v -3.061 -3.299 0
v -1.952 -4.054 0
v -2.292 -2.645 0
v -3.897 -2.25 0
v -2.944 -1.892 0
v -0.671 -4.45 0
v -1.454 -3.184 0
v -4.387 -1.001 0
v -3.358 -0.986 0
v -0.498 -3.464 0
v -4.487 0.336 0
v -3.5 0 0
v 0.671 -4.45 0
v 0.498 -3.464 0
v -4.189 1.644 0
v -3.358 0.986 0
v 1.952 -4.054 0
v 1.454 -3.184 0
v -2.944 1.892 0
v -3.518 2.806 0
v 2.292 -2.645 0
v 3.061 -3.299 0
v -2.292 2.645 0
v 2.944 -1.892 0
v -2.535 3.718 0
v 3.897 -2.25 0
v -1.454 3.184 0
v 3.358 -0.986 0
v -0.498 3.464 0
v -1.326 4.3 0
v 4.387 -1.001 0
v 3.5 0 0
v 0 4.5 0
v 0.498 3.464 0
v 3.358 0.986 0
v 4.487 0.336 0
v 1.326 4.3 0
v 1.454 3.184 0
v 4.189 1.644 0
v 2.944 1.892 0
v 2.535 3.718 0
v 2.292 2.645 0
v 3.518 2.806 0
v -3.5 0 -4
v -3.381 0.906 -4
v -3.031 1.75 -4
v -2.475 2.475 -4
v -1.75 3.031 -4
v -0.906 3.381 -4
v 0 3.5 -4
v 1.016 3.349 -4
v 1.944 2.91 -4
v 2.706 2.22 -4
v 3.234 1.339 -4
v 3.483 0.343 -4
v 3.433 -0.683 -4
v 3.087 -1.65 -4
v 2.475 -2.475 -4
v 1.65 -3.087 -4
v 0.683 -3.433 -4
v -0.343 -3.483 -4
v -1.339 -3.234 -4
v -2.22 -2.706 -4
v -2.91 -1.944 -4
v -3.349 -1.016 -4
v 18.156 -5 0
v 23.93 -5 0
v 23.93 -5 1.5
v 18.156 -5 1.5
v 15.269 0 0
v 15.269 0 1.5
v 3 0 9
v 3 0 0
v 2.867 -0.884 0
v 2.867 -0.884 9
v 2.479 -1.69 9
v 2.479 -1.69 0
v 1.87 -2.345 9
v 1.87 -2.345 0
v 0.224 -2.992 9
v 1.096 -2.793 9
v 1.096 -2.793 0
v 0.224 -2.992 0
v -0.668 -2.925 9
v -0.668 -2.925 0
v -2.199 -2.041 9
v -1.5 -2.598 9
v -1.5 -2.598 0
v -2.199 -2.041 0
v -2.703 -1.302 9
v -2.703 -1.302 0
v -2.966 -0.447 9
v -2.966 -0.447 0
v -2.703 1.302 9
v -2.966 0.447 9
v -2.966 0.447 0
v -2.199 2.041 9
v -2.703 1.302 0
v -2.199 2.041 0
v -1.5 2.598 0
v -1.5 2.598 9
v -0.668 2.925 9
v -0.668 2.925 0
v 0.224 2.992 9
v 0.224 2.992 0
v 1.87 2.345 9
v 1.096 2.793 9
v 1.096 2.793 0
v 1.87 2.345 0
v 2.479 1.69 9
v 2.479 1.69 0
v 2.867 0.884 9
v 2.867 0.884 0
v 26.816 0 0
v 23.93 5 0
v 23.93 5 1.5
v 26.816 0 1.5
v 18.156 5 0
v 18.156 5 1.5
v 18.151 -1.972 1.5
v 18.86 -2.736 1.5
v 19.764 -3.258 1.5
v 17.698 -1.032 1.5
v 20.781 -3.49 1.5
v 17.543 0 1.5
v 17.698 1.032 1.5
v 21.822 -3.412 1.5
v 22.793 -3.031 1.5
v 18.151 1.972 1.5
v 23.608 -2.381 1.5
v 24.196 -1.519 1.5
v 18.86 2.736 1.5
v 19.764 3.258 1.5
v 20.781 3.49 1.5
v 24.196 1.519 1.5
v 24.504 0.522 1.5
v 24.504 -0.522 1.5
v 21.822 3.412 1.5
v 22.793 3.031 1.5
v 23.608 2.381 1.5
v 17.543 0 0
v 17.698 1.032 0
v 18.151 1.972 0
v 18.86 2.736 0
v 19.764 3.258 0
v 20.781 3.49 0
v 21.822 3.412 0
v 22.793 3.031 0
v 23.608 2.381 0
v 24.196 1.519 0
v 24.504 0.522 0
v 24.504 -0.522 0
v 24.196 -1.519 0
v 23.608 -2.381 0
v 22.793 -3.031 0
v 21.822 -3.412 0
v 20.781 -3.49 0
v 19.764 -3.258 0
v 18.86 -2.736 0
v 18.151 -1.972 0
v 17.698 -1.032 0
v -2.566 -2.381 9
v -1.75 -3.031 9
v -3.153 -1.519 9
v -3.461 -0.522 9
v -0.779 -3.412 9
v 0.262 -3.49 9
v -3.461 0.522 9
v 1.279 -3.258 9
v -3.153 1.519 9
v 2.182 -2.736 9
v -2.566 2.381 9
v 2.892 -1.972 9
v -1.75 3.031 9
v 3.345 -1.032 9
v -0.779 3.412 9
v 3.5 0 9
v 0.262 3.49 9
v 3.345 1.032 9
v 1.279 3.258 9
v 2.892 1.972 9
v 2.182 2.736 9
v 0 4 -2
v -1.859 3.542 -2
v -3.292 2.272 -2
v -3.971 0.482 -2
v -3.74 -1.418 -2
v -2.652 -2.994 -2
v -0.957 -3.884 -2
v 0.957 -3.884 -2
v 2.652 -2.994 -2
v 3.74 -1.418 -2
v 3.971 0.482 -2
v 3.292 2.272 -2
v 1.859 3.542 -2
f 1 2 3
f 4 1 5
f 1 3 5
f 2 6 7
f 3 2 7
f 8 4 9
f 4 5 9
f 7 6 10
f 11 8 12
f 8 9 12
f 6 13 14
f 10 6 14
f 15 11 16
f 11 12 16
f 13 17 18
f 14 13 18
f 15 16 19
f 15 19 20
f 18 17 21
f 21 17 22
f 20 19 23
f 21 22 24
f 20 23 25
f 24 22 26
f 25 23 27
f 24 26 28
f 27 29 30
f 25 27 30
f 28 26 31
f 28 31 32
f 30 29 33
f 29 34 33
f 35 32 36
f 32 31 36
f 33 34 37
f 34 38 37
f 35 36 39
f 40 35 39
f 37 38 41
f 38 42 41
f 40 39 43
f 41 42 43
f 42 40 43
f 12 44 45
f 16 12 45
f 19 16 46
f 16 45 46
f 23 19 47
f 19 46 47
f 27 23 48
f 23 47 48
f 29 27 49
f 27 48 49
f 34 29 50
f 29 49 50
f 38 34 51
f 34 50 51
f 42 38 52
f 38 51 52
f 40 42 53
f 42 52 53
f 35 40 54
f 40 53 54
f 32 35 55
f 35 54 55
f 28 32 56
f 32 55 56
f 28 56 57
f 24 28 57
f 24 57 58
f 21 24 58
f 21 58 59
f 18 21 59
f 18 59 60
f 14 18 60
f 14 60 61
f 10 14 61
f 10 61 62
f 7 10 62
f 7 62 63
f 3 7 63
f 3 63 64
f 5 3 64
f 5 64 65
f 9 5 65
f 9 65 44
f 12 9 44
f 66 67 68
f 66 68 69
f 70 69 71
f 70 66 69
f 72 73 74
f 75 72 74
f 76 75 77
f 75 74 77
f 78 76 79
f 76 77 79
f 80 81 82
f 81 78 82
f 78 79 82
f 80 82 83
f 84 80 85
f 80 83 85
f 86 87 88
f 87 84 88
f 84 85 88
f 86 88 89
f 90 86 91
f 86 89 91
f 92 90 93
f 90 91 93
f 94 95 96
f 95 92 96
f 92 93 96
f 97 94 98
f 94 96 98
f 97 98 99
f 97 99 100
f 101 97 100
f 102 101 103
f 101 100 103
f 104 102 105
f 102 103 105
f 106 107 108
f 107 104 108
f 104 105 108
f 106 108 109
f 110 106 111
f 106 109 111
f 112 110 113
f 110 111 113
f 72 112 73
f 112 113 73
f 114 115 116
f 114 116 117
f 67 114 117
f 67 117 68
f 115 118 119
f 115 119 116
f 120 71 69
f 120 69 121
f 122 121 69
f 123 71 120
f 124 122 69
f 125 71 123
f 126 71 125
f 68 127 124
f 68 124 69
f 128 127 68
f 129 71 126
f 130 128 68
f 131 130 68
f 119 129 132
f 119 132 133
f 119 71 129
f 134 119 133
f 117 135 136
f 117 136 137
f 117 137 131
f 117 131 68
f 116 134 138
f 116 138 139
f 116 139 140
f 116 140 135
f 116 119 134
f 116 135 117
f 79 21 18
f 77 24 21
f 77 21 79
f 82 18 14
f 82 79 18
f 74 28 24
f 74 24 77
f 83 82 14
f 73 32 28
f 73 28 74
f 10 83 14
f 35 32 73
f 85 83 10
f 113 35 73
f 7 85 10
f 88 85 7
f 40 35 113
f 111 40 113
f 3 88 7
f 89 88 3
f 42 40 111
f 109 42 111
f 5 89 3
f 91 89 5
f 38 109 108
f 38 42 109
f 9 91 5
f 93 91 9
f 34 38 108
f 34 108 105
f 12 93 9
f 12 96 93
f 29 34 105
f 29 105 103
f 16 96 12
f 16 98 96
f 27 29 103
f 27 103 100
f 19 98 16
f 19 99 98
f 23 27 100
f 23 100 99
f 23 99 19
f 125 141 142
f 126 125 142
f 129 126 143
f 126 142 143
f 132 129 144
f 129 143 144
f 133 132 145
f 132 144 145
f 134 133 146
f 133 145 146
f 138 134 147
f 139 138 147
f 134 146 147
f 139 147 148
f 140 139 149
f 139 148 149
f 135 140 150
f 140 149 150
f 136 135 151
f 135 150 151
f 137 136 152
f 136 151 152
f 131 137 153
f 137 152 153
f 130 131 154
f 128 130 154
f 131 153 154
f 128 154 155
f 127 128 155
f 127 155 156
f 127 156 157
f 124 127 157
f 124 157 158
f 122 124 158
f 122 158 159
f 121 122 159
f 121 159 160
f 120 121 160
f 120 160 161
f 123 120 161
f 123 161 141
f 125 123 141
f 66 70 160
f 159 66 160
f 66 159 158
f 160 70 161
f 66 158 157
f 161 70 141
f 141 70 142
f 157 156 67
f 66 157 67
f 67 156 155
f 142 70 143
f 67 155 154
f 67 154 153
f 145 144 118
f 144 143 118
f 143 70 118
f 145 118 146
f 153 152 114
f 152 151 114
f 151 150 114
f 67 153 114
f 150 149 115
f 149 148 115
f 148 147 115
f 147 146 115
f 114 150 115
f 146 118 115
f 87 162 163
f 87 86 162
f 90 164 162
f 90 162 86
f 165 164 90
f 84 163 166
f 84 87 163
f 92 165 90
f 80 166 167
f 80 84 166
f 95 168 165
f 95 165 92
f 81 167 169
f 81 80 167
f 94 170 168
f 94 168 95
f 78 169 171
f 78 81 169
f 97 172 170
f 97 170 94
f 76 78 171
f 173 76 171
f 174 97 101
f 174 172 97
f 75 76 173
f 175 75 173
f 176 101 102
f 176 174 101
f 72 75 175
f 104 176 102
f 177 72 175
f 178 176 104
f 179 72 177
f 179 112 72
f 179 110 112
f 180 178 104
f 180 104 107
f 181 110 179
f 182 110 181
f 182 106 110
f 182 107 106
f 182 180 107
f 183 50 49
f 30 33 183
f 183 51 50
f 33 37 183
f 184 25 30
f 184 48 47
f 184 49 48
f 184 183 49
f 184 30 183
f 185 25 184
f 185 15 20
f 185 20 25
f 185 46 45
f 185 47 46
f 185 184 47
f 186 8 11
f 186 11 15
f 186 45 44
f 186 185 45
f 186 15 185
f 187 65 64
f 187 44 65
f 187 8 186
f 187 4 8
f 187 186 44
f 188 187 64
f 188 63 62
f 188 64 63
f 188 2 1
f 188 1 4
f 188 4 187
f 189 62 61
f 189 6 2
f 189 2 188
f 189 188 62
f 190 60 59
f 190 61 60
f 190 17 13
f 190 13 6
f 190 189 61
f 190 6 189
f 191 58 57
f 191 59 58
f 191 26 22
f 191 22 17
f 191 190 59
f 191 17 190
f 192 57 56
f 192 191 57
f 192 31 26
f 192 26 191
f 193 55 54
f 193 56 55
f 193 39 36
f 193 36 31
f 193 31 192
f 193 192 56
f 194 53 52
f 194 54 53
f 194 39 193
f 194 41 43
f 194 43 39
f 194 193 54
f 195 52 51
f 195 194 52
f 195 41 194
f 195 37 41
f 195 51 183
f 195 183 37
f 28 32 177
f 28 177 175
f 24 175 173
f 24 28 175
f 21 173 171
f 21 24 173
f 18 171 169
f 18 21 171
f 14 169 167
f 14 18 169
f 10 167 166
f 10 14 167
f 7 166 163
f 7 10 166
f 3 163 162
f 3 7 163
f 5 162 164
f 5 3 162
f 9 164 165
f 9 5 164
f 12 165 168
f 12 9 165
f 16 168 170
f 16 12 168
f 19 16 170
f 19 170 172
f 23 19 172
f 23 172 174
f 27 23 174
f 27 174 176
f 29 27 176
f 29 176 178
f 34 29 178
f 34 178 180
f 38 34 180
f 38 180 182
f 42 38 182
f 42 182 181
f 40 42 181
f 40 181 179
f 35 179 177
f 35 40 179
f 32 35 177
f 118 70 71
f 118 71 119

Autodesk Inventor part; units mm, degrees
ref_plane "YZ Plane" through (0, 0, 0) normal (1, 0, 0) x (0, 1, 0)
ref_plane "XZ Plane" through (0, 0, 0) normal (0, 1, 0) x (-1, 0, 0)
ref_plane "XY Plane" through (0, 0, 0) normal (0, 0, 1) x (1, 0, 0)
sketch "Эскиз1" plane through (0, 0, 0) normal (0, 0, 1) x (1, 0, 0)
  circle A0 centre (0, 0) radius 3
  circle A1 centre (0, 0) radius 3.5
  dimension "d0" = 6
  dimension "d1" = 7
extrude "Выдавливание1" add sketch "Эскиз1" along normal blind 9
sketch "Эскиз2" plane through (0, 0, 0) normal (0, 0, -1) x (-1, 0, 0)
  circle A0 centre (0, 0) radius 4.5
  dimension "d4" = 9
sketch "Эскиз3" plane through (0, 0, 0) normal (1, 0, 0) x (0, 1, 0)
  line L0 (0, 0) -> (0, -4)
  line L1 (0, -4) -> (3.5, -4)
  line L2 (0, 0) -> (4.5, 0)
  line L3 (3.5, 0) -> (-3.5, 0) projected
  line L4 (4.5, 0) -> (3.5, -4)
  dimension "d5" = 4
  dimension "d6" = 3.5
  dimension "d7" = 4.5
revolve "Вращение1" add sketch "Эскиз3" angle 360 about axis through (0, 0, 0) along (0, 0, -1)
sketch "Эскиз4" plane through (0, 0, -4) normal (0, 0, -1) x (-1, 0, 0)
  circle A0 centre (0, 0) radius 3.5
extrude "Выдавливание2" cut sketch "Эскиз4" against normal up to surface (4 mm away)
thread "Резьба1" size "M7x1" class "6g" standard "ANSI Metric M Profile" length 7 offset 2
sketch "Эскиз5" plane through (0, 0, 0) normal (0, 0, 1) x (1, 0, 0)
  line L0 (23.9295, 5) -> (26.8162, 0)
  line L1 (26.8162, 0) -> (23.9295, -5)
  line L2 (23.9295, -5) -> (18.1559, -5)
  line L3 (18.1559, -5) -> (15.2692, 0)
  line L4 (15.2692, 0) -> (18.1559, 5)
  line L5 (18.1559, 5) -> (23.9295, 5)
  point P0 (0, 0)
  point P1 (21.0427, 0)
  dimension "d13" = 10
extrude "Выдавливание3" add sketch "Эскиз5" along normal blind 1.5
sketch "Эскиз6" plane through (0, 0, 0) normal (0, 0, -1) x (-1, 0, 0)
  line L0 (-26.8162, 0) -> (-23.9295, 5) projected
  line L1 (-18.1559, 5) -> (-15.2692, 0) projected
  line L2 (-26.8162, 0) -> (-15.2692, 0)
  circle A0 centre (-21.0427, 0) radius 3.5
  point P0 (0, 0)
  dimension "d16" = 7
extrude "Выдавливание4" cut sketch "Эскиз6" against normal through all
properties part number "Винтики шпунтики(2 детали)"
